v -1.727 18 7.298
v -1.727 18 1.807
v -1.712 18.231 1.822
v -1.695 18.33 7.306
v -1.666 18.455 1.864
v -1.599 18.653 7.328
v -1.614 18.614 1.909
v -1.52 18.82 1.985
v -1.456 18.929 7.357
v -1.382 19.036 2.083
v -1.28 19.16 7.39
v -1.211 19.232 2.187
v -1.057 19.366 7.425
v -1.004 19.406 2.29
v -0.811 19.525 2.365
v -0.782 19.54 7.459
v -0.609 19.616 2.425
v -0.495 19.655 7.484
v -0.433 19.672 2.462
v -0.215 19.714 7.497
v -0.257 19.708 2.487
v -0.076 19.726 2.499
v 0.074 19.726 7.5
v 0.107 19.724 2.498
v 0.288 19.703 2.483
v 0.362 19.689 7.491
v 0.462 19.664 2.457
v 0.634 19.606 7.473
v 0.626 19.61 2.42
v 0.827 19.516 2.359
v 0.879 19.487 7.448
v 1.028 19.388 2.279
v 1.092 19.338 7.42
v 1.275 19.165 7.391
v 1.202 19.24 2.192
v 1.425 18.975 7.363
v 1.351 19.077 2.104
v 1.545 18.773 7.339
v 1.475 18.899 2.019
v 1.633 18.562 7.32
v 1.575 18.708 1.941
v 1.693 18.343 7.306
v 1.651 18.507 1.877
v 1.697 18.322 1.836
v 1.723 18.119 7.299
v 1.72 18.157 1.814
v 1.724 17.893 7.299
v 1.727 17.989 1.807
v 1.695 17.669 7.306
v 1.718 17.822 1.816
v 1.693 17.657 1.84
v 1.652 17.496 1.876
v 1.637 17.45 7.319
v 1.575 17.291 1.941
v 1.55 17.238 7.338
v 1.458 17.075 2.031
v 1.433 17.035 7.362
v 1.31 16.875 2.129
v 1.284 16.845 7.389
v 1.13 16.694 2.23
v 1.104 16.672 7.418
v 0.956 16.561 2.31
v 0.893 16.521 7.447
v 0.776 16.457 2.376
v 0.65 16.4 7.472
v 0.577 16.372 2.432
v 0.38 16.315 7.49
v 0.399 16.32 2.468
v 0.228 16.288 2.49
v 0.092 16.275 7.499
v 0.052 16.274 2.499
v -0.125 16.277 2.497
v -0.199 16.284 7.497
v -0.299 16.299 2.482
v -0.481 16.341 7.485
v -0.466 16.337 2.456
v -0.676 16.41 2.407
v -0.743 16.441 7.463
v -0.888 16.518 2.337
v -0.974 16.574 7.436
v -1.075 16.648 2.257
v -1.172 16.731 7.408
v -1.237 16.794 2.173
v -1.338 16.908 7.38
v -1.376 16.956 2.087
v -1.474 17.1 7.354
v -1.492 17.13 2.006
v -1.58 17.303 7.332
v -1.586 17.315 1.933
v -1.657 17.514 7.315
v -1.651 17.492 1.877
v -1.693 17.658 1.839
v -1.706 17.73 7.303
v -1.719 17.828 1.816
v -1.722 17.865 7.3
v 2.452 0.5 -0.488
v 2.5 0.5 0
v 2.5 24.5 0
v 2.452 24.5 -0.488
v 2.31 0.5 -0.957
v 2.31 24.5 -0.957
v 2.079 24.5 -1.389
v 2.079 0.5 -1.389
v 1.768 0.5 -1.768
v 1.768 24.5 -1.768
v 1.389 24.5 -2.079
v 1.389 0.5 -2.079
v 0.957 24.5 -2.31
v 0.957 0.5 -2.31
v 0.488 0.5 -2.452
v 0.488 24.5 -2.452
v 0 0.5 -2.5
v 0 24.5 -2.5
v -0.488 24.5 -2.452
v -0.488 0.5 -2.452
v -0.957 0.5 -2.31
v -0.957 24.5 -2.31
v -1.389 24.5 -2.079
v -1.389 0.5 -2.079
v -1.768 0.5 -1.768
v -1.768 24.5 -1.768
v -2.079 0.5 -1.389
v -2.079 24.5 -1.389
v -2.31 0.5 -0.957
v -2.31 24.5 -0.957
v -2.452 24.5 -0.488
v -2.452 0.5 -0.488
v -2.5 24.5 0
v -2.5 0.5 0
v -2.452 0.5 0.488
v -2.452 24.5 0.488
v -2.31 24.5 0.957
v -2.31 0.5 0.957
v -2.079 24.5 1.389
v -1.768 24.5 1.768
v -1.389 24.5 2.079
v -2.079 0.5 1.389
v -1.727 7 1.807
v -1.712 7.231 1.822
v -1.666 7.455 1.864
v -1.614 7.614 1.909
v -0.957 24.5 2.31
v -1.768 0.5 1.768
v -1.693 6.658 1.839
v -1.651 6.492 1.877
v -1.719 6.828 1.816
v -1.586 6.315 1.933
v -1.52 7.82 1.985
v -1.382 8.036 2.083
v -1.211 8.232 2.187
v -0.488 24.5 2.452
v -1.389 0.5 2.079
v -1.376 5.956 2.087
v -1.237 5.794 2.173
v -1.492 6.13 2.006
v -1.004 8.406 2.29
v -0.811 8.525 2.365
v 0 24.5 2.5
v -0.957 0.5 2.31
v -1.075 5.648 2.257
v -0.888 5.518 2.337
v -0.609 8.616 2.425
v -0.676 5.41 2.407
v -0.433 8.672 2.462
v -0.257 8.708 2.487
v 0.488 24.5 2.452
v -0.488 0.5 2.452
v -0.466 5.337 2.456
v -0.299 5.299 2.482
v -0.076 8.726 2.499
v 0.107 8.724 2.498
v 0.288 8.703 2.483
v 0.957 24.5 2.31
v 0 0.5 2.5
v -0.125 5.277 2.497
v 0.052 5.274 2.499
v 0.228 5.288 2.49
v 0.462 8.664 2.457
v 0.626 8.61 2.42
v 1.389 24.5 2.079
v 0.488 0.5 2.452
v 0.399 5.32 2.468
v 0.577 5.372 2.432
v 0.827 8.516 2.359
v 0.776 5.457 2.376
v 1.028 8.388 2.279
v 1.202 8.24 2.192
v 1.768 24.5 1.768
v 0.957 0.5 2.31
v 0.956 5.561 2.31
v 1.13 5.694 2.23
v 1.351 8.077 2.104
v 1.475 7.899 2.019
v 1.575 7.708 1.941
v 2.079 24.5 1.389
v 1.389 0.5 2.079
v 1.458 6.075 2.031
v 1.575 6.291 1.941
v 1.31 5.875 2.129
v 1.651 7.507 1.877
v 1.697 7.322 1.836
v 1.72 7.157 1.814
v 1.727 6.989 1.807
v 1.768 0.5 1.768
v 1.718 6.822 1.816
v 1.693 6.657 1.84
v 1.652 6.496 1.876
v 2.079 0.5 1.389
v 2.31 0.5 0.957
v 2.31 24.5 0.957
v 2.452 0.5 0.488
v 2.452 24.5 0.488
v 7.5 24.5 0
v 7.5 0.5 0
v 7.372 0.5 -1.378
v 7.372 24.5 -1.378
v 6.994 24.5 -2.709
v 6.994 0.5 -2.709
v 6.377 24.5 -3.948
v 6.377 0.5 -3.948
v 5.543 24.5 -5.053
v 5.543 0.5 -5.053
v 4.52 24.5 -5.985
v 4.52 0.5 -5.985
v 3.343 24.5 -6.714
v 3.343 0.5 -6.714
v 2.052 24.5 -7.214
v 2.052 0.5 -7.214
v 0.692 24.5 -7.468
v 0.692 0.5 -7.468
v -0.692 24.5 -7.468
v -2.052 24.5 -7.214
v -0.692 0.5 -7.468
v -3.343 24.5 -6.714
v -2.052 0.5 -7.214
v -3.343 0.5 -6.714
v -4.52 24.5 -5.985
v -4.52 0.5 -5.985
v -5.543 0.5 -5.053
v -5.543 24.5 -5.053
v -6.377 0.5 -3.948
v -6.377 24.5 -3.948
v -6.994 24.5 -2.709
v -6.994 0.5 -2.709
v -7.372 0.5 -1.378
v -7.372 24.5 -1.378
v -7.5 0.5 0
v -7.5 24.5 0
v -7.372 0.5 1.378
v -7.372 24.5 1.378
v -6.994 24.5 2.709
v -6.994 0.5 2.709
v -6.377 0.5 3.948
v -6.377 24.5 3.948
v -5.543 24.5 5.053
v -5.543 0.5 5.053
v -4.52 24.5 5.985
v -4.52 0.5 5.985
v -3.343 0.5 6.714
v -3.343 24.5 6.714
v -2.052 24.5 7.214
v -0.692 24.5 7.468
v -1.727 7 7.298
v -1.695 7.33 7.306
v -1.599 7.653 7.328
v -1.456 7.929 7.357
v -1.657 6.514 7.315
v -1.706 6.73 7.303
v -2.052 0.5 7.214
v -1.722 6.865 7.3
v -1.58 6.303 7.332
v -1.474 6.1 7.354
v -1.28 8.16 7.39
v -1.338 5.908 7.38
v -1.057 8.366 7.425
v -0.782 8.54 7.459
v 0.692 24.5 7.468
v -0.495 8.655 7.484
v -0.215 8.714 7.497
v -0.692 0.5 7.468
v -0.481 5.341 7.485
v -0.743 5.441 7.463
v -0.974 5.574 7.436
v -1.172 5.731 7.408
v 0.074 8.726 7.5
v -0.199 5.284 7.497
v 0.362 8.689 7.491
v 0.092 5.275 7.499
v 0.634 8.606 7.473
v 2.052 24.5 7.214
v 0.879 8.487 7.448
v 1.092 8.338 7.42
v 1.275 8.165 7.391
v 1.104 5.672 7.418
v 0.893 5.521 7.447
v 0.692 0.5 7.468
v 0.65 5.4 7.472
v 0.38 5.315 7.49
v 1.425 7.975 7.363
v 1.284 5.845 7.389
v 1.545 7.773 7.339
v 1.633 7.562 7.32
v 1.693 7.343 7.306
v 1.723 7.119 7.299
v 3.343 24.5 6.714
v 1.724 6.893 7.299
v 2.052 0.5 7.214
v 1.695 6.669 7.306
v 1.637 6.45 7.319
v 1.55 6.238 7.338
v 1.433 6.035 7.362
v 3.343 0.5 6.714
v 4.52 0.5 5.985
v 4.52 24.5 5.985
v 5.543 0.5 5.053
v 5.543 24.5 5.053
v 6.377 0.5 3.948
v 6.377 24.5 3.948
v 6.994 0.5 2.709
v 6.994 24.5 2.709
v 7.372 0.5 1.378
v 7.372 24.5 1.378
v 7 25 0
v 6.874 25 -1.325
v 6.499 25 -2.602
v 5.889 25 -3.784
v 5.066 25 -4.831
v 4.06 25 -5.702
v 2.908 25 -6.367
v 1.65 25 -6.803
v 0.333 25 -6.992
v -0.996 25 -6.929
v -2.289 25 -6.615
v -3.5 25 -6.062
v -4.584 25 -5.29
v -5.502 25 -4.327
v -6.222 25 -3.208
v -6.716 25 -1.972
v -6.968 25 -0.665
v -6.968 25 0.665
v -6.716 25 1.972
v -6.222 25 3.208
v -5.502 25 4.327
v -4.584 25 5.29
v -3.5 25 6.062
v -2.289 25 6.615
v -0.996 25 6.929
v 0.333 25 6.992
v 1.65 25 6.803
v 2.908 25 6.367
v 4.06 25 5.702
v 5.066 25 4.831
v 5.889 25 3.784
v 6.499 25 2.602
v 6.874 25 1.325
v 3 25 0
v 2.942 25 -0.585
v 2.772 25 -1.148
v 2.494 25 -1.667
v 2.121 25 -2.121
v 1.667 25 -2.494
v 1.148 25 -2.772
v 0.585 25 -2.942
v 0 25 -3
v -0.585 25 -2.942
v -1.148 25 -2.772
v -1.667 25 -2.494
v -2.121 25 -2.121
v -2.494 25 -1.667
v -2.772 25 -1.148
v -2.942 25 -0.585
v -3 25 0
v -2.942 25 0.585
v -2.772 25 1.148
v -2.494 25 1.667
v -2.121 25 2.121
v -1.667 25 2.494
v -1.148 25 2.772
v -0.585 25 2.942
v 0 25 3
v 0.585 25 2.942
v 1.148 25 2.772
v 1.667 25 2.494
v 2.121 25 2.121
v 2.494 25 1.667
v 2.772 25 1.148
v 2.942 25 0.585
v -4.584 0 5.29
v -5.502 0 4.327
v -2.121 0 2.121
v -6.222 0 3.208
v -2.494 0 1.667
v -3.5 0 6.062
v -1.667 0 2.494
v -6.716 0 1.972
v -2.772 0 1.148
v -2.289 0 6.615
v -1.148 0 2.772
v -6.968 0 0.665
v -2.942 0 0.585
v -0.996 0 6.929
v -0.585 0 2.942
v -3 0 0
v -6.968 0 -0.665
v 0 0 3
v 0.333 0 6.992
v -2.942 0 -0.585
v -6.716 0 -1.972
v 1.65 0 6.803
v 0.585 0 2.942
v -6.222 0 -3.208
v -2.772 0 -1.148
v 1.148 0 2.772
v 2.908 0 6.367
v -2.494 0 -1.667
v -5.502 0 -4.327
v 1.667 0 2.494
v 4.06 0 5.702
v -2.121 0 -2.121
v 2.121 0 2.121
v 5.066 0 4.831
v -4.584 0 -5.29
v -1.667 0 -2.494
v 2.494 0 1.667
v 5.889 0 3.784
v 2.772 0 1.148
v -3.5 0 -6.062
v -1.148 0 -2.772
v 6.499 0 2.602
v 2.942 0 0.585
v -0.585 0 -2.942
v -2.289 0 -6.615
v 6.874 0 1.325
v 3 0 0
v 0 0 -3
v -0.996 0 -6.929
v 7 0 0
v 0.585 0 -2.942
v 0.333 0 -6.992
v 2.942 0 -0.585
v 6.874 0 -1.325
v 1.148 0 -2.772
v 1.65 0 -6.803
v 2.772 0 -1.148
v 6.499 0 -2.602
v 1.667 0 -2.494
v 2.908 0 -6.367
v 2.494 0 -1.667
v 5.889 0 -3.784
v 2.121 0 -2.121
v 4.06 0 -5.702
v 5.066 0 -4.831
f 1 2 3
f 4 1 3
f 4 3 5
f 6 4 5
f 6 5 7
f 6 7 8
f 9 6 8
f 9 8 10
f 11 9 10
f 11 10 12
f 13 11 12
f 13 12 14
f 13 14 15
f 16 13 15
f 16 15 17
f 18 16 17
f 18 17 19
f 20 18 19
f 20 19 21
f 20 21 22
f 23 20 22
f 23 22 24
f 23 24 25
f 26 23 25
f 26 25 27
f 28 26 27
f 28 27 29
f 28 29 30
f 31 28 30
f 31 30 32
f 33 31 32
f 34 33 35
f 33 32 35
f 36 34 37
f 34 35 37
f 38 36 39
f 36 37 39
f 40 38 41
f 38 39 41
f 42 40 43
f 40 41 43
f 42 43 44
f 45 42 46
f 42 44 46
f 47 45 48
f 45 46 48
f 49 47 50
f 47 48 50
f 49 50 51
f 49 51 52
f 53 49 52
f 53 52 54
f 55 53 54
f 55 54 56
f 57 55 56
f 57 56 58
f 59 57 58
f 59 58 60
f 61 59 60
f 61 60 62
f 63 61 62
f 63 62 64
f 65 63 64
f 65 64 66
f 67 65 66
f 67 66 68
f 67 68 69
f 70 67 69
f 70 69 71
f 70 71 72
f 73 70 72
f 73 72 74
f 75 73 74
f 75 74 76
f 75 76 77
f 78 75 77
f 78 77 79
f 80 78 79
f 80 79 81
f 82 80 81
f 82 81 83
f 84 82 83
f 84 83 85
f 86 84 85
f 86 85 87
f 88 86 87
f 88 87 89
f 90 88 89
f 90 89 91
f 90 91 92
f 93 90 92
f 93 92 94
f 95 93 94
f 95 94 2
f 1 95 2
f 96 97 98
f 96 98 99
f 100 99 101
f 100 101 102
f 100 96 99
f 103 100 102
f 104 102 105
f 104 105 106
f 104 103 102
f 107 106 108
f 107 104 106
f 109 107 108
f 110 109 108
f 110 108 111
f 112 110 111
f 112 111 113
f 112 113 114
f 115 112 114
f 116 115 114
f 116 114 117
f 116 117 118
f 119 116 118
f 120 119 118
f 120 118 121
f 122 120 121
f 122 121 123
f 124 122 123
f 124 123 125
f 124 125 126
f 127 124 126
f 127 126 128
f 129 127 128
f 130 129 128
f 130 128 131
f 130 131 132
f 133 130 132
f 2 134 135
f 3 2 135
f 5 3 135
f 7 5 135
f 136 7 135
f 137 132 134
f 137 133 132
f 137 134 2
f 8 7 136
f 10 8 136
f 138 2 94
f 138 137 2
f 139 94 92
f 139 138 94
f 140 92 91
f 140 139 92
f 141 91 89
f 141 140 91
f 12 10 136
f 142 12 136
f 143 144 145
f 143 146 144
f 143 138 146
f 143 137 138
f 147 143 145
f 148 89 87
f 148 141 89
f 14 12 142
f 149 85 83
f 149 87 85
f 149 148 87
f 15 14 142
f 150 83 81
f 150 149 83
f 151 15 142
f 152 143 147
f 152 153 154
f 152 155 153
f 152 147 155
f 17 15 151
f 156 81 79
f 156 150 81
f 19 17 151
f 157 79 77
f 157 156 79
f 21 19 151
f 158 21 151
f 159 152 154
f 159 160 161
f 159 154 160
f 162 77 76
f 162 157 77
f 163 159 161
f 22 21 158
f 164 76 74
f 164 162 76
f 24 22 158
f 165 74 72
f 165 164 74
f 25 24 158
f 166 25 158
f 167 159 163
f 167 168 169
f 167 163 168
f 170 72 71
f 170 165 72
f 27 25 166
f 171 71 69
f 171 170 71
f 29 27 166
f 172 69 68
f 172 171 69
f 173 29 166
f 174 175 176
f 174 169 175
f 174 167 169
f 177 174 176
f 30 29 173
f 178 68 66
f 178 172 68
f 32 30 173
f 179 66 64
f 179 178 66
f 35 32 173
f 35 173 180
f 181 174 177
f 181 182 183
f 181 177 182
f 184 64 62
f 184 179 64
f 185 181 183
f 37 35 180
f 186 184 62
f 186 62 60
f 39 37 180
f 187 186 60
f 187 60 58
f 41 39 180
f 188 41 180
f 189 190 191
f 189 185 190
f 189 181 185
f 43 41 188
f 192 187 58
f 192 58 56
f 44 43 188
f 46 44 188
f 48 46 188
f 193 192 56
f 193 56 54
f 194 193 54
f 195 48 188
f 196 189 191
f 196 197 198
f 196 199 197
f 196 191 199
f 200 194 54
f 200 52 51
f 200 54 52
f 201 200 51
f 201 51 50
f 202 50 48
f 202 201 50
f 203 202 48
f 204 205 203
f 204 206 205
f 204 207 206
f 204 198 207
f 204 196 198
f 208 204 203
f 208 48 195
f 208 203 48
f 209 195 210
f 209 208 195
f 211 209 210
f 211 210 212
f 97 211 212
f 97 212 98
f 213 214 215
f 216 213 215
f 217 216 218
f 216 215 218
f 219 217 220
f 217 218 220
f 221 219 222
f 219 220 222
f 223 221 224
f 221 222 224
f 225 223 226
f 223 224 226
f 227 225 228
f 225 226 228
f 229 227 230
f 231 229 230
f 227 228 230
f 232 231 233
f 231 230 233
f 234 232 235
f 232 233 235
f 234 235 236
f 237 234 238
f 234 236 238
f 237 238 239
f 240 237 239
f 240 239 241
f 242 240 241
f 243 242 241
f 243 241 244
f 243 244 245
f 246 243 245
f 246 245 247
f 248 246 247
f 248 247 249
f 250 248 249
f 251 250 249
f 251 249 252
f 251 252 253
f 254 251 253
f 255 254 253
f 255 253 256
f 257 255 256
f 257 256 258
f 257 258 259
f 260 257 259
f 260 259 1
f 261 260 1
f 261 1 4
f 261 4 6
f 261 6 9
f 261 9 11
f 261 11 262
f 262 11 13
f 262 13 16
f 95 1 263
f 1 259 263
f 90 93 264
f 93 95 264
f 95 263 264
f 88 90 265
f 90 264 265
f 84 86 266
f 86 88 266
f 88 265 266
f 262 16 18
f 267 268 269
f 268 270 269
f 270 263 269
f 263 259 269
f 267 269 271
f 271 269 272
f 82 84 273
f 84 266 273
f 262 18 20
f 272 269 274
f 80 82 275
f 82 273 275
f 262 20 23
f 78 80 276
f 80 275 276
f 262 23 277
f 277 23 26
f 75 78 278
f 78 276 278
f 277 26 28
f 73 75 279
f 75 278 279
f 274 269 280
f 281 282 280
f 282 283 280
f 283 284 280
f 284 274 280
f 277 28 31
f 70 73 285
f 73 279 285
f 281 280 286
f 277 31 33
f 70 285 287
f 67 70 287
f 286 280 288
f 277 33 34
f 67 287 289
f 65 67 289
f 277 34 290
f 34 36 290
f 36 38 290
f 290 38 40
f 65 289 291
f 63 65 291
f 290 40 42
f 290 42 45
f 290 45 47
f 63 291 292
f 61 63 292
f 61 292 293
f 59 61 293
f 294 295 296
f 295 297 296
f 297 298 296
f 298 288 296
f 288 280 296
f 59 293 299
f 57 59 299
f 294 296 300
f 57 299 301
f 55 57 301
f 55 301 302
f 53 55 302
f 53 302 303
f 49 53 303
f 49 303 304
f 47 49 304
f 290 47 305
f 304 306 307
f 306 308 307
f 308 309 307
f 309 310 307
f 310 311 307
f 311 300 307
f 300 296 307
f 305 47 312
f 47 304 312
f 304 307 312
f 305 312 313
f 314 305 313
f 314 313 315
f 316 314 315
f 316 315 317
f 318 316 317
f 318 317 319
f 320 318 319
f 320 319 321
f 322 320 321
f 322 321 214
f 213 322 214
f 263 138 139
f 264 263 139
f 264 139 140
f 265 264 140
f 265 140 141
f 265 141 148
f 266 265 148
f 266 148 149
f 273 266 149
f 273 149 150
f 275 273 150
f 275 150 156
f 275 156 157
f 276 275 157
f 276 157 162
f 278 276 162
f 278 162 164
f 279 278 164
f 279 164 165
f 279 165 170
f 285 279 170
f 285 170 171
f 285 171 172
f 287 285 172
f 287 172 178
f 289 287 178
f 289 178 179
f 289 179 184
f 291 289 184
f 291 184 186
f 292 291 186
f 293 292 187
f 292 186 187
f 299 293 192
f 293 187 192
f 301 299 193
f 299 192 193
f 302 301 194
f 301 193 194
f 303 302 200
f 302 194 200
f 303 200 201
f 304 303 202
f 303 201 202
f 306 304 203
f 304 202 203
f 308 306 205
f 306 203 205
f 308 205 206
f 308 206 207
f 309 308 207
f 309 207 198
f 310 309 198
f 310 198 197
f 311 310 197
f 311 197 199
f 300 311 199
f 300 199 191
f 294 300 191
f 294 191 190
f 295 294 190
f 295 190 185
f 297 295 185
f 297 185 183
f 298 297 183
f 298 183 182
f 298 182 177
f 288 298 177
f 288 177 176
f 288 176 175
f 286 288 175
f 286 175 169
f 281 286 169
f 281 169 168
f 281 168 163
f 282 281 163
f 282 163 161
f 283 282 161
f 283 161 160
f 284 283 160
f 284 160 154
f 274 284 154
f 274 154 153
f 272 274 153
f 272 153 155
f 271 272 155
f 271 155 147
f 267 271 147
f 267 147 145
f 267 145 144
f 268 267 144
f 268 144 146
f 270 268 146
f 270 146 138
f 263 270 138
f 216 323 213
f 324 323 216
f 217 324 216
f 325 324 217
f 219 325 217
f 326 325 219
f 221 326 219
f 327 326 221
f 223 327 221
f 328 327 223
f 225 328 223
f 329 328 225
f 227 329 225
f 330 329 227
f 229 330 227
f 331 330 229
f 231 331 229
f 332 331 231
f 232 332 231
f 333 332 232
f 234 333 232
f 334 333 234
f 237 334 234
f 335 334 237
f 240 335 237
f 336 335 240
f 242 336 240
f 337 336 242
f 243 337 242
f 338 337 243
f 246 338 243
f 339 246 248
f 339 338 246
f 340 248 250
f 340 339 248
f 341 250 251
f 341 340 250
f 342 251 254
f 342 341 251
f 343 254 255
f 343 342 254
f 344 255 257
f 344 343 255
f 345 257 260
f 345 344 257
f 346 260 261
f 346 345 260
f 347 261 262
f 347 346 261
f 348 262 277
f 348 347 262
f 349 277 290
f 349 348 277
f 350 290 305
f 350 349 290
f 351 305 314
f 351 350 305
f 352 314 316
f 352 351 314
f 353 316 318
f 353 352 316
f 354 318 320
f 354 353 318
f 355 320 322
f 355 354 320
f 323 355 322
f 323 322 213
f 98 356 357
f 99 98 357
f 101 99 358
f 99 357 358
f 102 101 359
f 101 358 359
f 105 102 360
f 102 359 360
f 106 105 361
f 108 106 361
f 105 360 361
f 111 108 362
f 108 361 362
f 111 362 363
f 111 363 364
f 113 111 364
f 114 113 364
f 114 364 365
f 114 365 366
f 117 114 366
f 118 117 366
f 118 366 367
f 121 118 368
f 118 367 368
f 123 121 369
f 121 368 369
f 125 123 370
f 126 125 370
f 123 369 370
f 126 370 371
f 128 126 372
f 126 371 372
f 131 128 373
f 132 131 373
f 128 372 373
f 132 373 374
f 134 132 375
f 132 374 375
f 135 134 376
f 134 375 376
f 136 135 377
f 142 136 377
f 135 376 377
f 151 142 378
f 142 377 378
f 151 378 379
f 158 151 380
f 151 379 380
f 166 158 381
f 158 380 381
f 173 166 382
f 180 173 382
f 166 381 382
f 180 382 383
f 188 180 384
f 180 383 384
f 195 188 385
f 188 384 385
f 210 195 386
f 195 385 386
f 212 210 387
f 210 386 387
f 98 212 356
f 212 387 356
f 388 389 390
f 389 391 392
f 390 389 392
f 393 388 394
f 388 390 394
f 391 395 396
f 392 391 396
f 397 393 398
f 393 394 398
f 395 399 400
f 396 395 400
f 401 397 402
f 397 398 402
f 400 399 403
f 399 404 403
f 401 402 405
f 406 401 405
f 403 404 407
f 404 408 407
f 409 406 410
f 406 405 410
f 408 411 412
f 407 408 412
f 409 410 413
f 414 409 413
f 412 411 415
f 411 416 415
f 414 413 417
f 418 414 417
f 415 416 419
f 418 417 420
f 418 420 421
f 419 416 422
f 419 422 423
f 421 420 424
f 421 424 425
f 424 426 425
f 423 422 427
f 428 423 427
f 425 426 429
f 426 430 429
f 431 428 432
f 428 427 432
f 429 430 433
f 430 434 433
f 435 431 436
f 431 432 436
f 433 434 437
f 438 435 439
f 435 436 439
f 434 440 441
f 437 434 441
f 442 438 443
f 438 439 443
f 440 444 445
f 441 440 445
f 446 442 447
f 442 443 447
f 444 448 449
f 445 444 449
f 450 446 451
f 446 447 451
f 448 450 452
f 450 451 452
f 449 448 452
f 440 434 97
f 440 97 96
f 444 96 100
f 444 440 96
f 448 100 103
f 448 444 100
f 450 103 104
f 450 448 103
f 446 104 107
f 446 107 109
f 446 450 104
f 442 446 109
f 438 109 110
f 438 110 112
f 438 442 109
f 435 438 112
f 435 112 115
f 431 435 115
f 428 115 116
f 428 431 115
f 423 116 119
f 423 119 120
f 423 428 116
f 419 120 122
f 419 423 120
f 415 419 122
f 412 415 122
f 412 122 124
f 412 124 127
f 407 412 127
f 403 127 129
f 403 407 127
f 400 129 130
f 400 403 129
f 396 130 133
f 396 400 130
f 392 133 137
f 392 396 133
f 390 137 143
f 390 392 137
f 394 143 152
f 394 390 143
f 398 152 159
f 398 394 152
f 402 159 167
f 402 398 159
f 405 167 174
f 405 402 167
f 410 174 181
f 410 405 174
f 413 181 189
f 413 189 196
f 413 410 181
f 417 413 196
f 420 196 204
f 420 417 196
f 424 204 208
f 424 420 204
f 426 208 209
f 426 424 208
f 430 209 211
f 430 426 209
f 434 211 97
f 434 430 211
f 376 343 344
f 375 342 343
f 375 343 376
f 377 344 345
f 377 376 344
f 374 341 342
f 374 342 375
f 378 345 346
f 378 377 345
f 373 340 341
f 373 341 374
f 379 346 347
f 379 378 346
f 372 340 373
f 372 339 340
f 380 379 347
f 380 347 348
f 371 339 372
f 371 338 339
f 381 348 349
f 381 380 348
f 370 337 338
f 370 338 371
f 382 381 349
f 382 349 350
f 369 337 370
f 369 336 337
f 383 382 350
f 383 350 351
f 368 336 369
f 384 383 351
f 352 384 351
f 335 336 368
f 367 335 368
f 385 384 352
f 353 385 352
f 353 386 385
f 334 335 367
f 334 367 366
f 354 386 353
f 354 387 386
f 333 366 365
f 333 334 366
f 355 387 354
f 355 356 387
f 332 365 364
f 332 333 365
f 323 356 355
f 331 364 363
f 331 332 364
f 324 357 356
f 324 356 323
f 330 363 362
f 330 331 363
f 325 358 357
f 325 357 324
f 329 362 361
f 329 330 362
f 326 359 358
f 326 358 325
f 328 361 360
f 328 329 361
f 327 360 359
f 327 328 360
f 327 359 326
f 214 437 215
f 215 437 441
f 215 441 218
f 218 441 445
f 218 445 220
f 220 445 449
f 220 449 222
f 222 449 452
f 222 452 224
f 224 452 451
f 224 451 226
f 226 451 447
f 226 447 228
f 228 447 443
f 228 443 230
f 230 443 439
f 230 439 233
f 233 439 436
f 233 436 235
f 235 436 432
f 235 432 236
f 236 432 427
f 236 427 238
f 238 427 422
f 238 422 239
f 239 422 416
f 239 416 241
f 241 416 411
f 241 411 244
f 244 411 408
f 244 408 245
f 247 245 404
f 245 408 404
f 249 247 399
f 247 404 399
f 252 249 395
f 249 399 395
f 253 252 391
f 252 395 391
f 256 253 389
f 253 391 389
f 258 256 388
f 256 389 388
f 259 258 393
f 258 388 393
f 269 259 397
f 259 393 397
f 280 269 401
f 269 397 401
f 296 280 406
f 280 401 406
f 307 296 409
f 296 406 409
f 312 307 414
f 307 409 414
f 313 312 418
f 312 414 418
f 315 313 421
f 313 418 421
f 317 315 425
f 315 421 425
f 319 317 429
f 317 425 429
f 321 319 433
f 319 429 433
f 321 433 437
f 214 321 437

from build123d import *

# Parameters (mm, degrees)
SKETCH1_R                 = 7.5
SKETCH1_R_2               = 2.5
BOSS_EXTRUDE1_DEPTH       = 25
CHAMFER1_SIZE             = 0.5
F_8_32_TAPPED_HOLE1_D     = 3.4544
F_8_32_TAPPED_HOLE1_DEPTH = 18
F_8_32_TAPPED_HOLE1_TIP   = 1.037806461


with BuildPart() as part:
    # Sketch1 → Boss-Extrude1 (new body)
    with BuildSketch(Plane(origin=(0, 0, 0), x_dir=(1, 0, 0), z_dir=(0, 1, 0))):
        Circle(SKETCH1_R)
        Circle(SKETCH1_R_2, mode=Mode.SUBTRACT)
    extrude(amount=BOSS_EXTRUDE1_DEPTH)

    # Chamfer1
    chamfer1_edges = [part.edges().sort_by_distance(p)[0] for p in [
        (-7.5, 0, 0),
        (-7.5, 25, 0),
        (-2.5, 0, 0),
        (-2.5, 25, 0),
    ]]
    chamfer(chamfer1_edges, length=CHAMFER1_SIZE)

    # #8-32 Tapped Hole1
    with Locations(Plane.XY.offset(19.05)):
        with Locations((0, 18), (0, 7)):
            Hole(F_8_32_TAPPED_HOLE1_D / 2, depth=F_8_32_TAPPED_HOLE1_DEPTH)
            with Locations((0, 0, -(F_8_32_TAPPED_HOLE1_DEPTH + F_8_32_TAPPED_HOLE1_TIP / 2))):  # 118° drill point
                Cone(0, F_8_32_TAPPED_HOLE1_D / 2, F_8_32_TAPPED_HOLE1_TIP, mode=Mode.SUBTRACT)


solid = part.part
